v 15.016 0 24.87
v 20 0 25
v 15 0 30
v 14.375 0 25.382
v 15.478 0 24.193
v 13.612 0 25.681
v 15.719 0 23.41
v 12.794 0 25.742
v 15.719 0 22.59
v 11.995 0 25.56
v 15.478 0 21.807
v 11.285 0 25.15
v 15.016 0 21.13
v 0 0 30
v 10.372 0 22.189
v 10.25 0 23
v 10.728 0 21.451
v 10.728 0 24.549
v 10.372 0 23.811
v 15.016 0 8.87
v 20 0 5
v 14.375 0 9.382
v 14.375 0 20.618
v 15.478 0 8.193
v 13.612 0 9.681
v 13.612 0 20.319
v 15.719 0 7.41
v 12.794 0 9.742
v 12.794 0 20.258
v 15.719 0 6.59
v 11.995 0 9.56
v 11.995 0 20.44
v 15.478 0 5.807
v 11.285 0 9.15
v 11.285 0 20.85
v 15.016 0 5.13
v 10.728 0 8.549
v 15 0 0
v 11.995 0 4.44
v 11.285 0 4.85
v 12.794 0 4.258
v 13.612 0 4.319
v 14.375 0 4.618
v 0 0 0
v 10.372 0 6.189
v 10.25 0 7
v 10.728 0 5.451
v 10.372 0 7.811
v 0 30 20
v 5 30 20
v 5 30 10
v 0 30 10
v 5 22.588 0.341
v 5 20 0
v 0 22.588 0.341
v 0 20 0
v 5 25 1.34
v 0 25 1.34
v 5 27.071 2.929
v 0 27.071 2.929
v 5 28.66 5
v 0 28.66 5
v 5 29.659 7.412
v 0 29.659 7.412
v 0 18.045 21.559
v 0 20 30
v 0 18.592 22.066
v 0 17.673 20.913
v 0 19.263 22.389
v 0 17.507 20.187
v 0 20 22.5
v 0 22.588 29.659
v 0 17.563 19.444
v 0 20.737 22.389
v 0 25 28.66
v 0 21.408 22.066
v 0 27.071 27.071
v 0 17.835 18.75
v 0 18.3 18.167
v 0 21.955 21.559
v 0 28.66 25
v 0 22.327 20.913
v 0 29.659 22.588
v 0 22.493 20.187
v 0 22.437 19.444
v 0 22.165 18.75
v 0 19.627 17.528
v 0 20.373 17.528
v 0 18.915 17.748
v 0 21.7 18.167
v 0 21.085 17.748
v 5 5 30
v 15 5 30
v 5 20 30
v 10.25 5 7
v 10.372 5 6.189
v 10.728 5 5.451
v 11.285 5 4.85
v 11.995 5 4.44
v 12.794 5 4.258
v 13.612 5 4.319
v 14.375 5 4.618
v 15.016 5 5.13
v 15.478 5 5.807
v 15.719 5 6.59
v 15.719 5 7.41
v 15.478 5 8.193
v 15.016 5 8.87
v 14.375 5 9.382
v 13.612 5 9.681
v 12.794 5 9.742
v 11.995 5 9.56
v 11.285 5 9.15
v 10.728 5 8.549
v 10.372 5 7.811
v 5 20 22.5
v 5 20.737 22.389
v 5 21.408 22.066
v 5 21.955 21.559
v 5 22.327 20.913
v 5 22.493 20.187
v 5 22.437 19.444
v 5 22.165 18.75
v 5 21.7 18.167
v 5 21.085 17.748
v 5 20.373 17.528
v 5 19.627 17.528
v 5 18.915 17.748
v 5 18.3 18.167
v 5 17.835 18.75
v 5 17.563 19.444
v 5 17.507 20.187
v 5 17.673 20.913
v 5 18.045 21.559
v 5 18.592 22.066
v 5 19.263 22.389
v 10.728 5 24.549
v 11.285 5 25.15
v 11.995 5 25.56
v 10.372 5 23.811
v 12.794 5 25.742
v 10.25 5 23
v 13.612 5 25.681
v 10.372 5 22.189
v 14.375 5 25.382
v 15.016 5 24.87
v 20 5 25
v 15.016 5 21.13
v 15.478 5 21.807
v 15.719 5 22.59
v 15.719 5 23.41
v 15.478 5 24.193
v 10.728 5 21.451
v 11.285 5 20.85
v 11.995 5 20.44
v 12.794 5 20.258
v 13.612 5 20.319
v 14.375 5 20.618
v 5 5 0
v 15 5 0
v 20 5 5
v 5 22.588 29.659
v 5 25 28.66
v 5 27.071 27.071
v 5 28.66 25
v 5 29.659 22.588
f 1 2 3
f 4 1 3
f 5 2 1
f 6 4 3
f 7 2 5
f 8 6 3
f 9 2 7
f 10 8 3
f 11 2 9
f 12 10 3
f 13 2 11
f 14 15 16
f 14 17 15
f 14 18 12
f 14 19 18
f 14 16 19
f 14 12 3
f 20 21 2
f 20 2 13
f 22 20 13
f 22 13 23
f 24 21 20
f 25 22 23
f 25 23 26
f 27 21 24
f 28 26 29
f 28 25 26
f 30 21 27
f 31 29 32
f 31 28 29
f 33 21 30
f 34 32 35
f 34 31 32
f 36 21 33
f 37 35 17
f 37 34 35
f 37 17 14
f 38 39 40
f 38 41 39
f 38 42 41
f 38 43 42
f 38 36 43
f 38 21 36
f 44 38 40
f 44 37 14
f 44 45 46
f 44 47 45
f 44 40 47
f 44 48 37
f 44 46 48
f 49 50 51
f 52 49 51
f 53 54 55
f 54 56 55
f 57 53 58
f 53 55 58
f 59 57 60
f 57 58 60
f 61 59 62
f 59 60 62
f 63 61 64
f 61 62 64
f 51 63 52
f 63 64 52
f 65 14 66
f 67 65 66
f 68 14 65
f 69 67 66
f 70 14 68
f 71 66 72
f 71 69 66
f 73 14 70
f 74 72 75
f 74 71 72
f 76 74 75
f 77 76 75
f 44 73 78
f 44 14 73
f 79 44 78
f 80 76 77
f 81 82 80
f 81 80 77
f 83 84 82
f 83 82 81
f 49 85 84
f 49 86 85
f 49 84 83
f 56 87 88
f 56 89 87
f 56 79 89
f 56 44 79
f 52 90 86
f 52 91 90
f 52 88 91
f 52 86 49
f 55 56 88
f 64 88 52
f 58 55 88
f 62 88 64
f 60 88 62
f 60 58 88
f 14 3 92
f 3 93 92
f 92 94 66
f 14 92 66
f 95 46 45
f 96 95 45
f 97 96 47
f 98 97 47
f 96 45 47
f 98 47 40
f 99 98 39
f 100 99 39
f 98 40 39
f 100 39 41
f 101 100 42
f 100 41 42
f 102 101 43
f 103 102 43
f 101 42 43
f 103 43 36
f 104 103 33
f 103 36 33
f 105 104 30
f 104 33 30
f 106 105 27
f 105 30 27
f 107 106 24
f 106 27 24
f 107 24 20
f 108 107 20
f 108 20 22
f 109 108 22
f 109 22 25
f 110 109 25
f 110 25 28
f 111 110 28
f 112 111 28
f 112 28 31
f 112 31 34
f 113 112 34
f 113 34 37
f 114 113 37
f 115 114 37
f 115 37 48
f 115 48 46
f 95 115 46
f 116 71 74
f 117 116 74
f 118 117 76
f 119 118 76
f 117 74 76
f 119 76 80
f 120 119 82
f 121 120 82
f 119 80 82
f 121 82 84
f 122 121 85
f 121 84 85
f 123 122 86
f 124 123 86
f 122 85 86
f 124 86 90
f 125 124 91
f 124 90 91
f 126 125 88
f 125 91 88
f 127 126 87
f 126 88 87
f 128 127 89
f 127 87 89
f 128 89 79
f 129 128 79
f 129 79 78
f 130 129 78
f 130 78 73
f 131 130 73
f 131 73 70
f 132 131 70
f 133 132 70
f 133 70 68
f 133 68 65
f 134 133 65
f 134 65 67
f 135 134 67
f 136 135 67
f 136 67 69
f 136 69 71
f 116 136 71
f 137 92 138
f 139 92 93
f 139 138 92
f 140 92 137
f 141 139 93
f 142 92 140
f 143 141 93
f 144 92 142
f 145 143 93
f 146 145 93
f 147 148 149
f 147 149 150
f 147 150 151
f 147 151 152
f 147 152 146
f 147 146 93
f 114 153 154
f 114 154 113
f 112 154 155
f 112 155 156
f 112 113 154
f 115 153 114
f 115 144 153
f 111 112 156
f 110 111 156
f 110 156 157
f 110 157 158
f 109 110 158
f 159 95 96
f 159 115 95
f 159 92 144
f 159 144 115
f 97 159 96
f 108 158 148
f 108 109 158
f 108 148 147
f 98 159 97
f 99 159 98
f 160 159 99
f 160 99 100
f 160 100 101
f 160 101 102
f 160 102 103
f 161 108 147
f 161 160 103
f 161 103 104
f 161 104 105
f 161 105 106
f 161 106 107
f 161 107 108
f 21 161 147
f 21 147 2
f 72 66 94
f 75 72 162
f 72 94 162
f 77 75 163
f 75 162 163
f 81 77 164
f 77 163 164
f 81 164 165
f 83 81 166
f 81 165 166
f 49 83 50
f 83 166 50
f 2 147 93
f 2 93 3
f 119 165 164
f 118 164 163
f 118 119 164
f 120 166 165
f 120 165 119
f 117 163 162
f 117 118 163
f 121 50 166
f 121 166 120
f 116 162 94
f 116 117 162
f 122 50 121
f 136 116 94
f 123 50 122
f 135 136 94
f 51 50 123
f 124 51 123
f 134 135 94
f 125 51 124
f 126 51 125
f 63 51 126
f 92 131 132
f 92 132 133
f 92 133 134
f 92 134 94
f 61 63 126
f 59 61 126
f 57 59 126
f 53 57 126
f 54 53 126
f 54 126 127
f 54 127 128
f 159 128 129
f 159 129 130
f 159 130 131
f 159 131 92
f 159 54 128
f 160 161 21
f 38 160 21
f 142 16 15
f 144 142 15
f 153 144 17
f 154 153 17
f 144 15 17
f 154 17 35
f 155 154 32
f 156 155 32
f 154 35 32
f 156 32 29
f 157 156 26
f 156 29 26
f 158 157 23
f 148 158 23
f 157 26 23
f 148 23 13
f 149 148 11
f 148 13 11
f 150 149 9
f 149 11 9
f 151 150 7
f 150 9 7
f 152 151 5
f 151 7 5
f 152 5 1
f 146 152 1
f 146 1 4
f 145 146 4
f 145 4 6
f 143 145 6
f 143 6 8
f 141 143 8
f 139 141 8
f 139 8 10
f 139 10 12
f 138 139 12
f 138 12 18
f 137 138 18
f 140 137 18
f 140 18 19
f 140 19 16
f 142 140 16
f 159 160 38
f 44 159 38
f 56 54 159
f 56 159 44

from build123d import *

# Parameters (mm, degrees)
BOSS_EXTRUDE1_DEPTH        = 30
M6_TAPPED_HOLE2_D          = 5
F_5_5_5_5_DIAMETER_HOLE1_D = 5.5
CUT_EXTRUDE1_DEPTH         = 51.68530359
FILLET3_R                  = 10
CHAMFER1_SIZE              = 5


with BuildPart() as part:
    # Sketch1 → Boss-Extrude1 (new body)
    with BuildSketch(Plane.XY):
        Polygon((0, 0), (0, 38), (5, 38), (5, 5), (20, 5), (20, 0), align=None)
    extrude(amount=BOSS_EXTRUDE1_DEPTH)

    # M6 Tapped Hole2 (through all)
    with Locations(Plane(origin=(5, 0, 0), x_dir=(0, 0, -1), z_dir=(1, 0, 0))):
        with Locations((-20, 20)):
            Hole(M6_TAPPED_HOLE2_D / 2)

    # Ø5.5 (5.5) Diameter Hole1 (through all)
    with Locations(Plane(origin=(0, 5, 0), x_dir=(1, 0, 0), z_dir=(0, 1, 0))):
        with Locations((13, -7), (13, -23)):
            Hole(F_5_5_5_5_DIAMETER_HOLE1_D / 2)

    # Sketch13 → Cut-Extrude1 (cut, through all)
    with BuildSketch(Plane(origin=(5, 0, 0), x_dir=(0, 0, -1), z_dir=(1, 0, 0))):
        with BuildLine():
            Line((-20, 30), (0, 30))
            Line((0, 30), (0, 38))
            Line((0, 38), (-30, 38))
            Line((-30, 38), (-30, 20))
            ThreePointArc((-30, 20), (-27.071067812, 27.071067812), (-20, 30))
        make_face()
    extrude(amount=-CUT_EXTRUDE1_DEPTH, mode=Mode.SUBTRACT)

    # Fillet3
    fillet3_edges = [part.edges().sort_by_distance(p)[0] for p in [
        (2.5, 30, 0),
    ]]
    fillet(fillet3_edges, radius=FILLET3_R)

    # Chamfer1
    chamfer1_edges = [part.edges().sort_by_distance(p)[0] for p in [
        (20, 2.5, 0),
        (20, 2.5, 30),
    ]]
    chamfer(chamfer1_edges, length=CHAMFER1_SIZE)


solid = part.part
